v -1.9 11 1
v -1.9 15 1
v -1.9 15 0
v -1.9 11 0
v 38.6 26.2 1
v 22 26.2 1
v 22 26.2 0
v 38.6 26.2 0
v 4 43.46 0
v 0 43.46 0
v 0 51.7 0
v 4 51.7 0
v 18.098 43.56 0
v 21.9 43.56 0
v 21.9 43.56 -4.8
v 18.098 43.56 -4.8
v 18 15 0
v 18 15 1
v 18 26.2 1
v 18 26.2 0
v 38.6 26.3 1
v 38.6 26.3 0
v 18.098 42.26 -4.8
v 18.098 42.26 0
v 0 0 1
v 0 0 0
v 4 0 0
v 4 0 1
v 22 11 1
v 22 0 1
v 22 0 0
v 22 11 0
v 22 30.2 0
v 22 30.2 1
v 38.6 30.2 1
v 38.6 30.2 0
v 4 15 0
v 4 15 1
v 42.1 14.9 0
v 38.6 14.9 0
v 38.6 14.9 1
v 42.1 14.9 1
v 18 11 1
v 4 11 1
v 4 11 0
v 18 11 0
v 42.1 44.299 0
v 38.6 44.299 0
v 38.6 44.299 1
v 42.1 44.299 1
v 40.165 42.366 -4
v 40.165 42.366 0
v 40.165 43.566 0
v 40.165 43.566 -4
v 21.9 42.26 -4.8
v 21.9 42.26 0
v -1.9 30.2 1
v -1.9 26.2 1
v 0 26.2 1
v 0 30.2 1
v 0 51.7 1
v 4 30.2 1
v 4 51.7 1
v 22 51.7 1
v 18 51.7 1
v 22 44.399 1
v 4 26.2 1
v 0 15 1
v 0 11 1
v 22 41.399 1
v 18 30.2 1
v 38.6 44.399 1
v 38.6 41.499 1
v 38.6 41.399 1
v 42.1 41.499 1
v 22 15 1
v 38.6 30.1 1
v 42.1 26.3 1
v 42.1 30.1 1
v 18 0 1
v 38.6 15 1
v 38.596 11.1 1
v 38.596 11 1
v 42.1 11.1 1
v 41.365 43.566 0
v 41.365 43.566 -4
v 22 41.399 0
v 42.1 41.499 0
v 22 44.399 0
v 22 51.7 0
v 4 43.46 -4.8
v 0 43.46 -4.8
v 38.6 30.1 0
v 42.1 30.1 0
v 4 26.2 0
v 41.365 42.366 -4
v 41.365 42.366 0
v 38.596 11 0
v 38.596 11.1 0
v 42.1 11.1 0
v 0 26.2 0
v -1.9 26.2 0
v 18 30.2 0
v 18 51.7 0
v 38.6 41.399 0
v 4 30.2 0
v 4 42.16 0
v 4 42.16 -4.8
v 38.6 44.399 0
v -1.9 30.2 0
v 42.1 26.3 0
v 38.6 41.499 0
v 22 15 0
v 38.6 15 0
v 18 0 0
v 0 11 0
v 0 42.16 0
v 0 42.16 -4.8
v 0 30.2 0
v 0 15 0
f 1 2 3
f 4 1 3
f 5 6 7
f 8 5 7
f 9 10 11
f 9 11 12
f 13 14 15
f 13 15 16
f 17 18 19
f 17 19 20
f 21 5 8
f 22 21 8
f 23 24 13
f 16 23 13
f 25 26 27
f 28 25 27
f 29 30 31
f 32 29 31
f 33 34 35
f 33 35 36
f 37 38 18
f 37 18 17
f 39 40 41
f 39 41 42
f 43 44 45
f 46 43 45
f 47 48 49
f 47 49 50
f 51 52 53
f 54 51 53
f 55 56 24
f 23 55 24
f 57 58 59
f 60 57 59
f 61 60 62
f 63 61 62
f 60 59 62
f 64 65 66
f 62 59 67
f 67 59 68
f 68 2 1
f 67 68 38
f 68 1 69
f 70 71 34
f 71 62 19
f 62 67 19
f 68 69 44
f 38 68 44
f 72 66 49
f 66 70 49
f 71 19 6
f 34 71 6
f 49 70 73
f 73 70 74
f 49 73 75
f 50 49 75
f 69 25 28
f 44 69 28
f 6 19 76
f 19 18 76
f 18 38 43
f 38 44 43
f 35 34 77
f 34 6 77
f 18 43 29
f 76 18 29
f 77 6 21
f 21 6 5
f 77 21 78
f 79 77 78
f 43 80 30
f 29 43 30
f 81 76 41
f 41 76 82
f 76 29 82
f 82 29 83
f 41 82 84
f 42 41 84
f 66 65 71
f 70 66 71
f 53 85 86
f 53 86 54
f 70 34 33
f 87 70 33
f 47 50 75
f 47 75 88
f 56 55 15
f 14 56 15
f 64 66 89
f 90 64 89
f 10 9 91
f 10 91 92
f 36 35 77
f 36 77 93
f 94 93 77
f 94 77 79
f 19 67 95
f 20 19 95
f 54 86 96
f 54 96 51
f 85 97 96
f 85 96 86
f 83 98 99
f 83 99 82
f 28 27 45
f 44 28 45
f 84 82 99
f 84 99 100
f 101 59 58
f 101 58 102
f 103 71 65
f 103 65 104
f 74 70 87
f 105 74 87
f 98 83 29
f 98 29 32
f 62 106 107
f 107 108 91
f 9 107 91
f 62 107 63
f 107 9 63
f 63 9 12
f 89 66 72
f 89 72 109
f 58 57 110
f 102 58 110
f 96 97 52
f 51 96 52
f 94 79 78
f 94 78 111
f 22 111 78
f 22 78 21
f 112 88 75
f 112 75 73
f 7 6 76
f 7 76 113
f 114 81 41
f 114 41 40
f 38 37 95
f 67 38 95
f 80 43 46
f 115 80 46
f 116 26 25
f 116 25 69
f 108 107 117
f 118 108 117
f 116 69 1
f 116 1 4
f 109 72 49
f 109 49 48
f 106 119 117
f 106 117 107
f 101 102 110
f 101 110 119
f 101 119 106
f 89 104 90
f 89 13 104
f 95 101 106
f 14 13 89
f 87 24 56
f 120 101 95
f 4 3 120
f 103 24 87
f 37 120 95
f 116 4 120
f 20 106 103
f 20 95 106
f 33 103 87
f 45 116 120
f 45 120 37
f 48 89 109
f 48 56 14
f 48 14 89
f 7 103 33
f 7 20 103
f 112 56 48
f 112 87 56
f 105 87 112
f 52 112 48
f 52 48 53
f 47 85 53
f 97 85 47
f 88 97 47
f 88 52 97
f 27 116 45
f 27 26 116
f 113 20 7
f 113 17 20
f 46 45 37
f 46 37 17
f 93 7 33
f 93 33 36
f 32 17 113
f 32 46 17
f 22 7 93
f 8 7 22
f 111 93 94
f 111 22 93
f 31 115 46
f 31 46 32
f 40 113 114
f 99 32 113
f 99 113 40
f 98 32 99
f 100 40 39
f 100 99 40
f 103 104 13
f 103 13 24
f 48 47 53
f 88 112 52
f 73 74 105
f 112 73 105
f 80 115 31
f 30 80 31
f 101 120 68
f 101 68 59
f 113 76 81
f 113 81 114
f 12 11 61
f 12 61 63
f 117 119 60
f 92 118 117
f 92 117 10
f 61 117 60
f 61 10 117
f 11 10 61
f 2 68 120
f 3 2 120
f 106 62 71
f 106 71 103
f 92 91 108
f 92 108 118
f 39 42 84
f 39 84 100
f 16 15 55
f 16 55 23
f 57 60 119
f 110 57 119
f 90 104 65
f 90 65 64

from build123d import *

# Parameters (mm, degrees)
SCHIZZO1_W                        = 4
SCHIZZO1_H                        = 51.7
ESTRUSIONE_ESTRUSIONE1_DEPTH      = 1
SCHIZZO2_W                        = 1
SCHIZZO2_H                        = 4
ESTRUSIONE_ESTRUSIONE2_DEPTH      = 18
ESTRUSIONE_ESTRUSIONE2_DEPTH_BACK = 5.9
SCHIZZO3_W                        = 1
SCHIZZO3_H                        = 4
ESTRUSIONE_ESTRUSIONE3_DEPTH      = 18
ESTRUSIONE_ESTRUSIONE3_DEPTH_BACK = 5.9
SCHIZZO4_W                        = 4
SCHIZZO4_H                        = 1
ESTRUSIONE_ESTRUSIONE4_DEPTH      = 21.5
ESTRUSIONE_ESTRUSIONE4_DEPTH_BACK = 30.2
SCHIZZO5_W                        = 1
SCHIZZO5_H                        = 3
ESTRUSIONE_ESTRUSIONE5_DEPTH      = 21
SCHIZZO7_W                        = 1
SCHIZZO7_H                        = 4
ESTRUSIONE_ESTRUSIONE6_DEPTH      = 21
SCHIZZO8_W                        = 1
SCHIZZO8_H                        = 4
ESTRUSIONE_ESTRUSIONE7_DEPTH      = 21
SCHIZZO10_W                       = 4
SCHIZZO10_H                       = 1.3
ESTRUSIONE_ESTRUSIONE9_DEPTH      = 4.8
SCHIZZO11_W                       = 3.9
SCHIZZO11_H                       = 1.3
ESTRUSIONE_ESTRUSIONE10_DEPTH     = 4.8
SCHIZZO12_W                       = 1.2
SCHIZZO12_H                       = 1.2
ESTRUSIONE_ESTRUSIONE11_DEPTH     = 4
SCHIZZO13_W                       = 1
SCHIZZO13_H                       = 4
TAGLIO_ESTRUSIONE1_DEPTH          = 0.9
SCHIZZO14_W                       = 1
SCHIZZO14_H                       = 4
TAGLIO_ESTRUSIONE2_DEPTH          = 0.9
SCHIZZO15_W                       = 1
SCHIZZO15_H                       = 3
TAGLIO_ESTRUSIONE3_DEPTH          = 0.9
SCHIZZO16_W                       = 3.503631624
SCHIZZO16_H                       = 1
TAGLIO_ESTRUSIONE4_DEPTH          = 0.1
SCHIZZO17_W                       = 3.5
SCHIZZO17_H                       = 1
TAGLIO_ESTRUSIONE5_DEPTH          = 0.1
SCHIZZO18_W                       = 3.5
SCHIZZO18_H                       = 1
TAGLIO_ESTRUSIONE6_DEPTH          = 0.1
SCHIZZO19_W                       = 3.5
SCHIZZO19_H                       = 1
TAGLIO_ESTRUSIONE7_DEPTH          = 0.1
SCHIZZO20_W                       = 3.5
SCHIZZO20_H                       = 1
TAGLIO_ESTRUSIONE8_DEPTH          = 0.1
SCHIZZO21_W                       = 3.5
SCHIZZO21_H                       = 1
TAGLIO_ESTRUSIONE9_DEPTH          = 0.1
SCHIZZO22_W                       = 0.098173234
SCHIZZO22_H                       = 1.3
TAGLIO_ESTRUSIONE10_DEPTH         = 4.8


with BuildPart() as part:
    # Schizzo1 → Estrusione-Estrusione1 (new body)
    with BuildSketch(Plane.XY):
        with Locations((2, 25.85)):
            Rectangle(SCHIZZO1_W, SCHIZZO1_H)
    extrude(amount=ESTRUSIONE_ESTRUSIONE1_DEPTH)

    # Schizzo2 → Estrusione-Estrusione2 (add, two sides)
    with BuildSketch(Plane(origin=(4, 0, 0), x_dir=(0, 0, -1), z_dir=(1, 0, 0))) as estrusione_estrusione2_sk:
        with Locations((-0.5, 28.2)):
            Rectangle(SCHIZZO2_W, SCHIZZO2_H)
    extrude(amount=ESTRUSIONE_ESTRUSIONE2_DEPTH)
    extrude(estrusione_estrusione2_sk.sketch, amount=-ESTRUSIONE_ESTRUSIONE2_DEPTH_BACK)

    # Schizzo3 → Estrusione-Estrusione3 (add, two sides)
    with BuildSketch(Plane(origin=(4, 0, 0), x_dir=(0, 0, -1), z_dir=(1, 0, 0))) as estrusione_estrusione3_sk:
        with Locations((-0.5, 13)):
            Rectangle(SCHIZZO3_W, SCHIZZO3_H)
    extrude(amount=ESTRUSIONE_ESTRUSIONE3_DEPTH)
    extrude(estrusione_estrusione3_sk.sketch, amount=-ESTRUSIONE_ESTRUSIONE3_DEPTH_BACK)

    # Schizzo4 → Estrusione-Estrusione4 (add, two sides)
    with BuildSketch(Plane(origin=(0, 30.2, 0), x_dir=(1, 0, 0), z_dir=(0, 1, 0))) as estrusione_estrusione4_sk:
        with Locations((20, -0.5)):
            Rectangle(SCHIZZO4_W, SCHIZZO4_H)
    extrude(amount=ESTRUSIONE_ESTRUSIONE4_DEPTH)
    extrude(estrusione_estrusione4_sk.sketch, amount=-ESTRUSIONE_ESTRUSIONE4_DEPTH_BACK)

    # Schizzo5 → Estrusione-Estrusione5 (add)
    with BuildSketch(Plane(origin=(22, 0, 0), x_dir=(0, 0, -1), z_dir=(1, 0, 0))):
        with Locations((-0.5, 42.898738045)):
            Rectangle(SCHIZZO5_W, SCHIZZO5_H)
    extrude(amount=ESTRUSIONE_ESTRUSIONE5_DEPTH)

    # Schizzo7 → Estrusione-Estrusione6 (add)
    with BuildSketch(Plane(origin=(22, 0, 0), x_dir=(0, 0, -1), z_dir=(1, 0, 0))):
        with Locations((-0.5, 13)):
            Rectangle(SCHIZZO7_W, SCHIZZO7_H)
    extrude(amount=ESTRUSIONE_ESTRUSIONE6_DEPTH)

    # Schizzo8 → Estrusione-Estrusione7 (add)
    with BuildSketch(Plane(origin=(22, 0, 0), x_dir=(0, 0, -1), z_dir=(1, 0, 0))):
        with Locations((-0.5, 28.2)):
            Rectangle(SCHIZZO8_W, SCHIZZO8_H)
    extrude(amount=ESTRUSIONE_ESTRUSIONE7_DEPTH)

    # Schizzo10 → Estrusione-Estrusione9 (add)
    with BuildSketch(Plane(origin=(0, 0, 0), x_dir=(-1, 0, 0), z_dir=(0, 0, -1))):
        with Locations((-2, 42.81)):
            Rectangle(SCHIZZO10_W, SCHIZZO10_H)
    extrude(amount=ESTRUSIONE_ESTRUSIONE9_DEPTH)

    # Schizzo11 → Estrusione-Estrusione10 (add)
    with BuildSketch(Plane(origin=(0, 0, 0), x_dir=(-1, 0, 0), z_dir=(0, 0, -1))):
        with Locations((-19.95, 42.91)):
            Rectangle(SCHIZZO11_W, SCHIZZO11_H)
    extrude(amount=ESTRUSIONE_ESTRUSIONE10_DEPTH)

    # Schizzo12 → Estrusione-Estrusione11 (add)
    with BuildSketch(Plane(origin=(0, 0, 0), x_dir=(-1, 0, 0), z_dir=(0, 0, -1))):
        with Locations((-40.765421969, 42.965995875)):
            Rectangle(SCHIZZO12_W, SCHIZZO12_H)
    extrude(amount=ESTRUSIONE_ESTRUSIONE11_DEPTH)

    # Schizzo13 → Taglio-Estrusione1 (cut)
    with BuildSketch(Plane(origin=(43, 0, 0), x_dir=(0, 0, -1), z_dir=(1, 0, 0))):
        with Locations((-0.5, 28.2)):
            Rectangle(SCHIZZO13_W, SCHIZZO13_H)
    extrude(amount=-TAGLIO_ESTRUSIONE1_DEPTH, mode=Mode.SUBTRACT)

    # Schizzo14 → Taglio-Estrusione2 (cut)
    with BuildSketch(Plane(origin=(43, 0, 0), x_dir=(0, 0, -1), z_dir=(1, 0, 0))):
        with Locations((-0.5, 13)):
            Rectangle(SCHIZZO14_W, SCHIZZO14_H)
    extrude(amount=-TAGLIO_ESTRUSIONE2_DEPTH, mode=Mode.SUBTRACT)

    # Schizzo15 → Taglio-Estrusione3 (cut)
    with BuildSketch(Plane(origin=(43, 0, 0), x_dir=(0, 0, -1), z_dir=(1, 0, 0))):
        with Locations((-0.5, 42.898738045)):
            Rectangle(SCHIZZO15_W, SCHIZZO15_H)
    extrude(amount=-TAGLIO_ESTRUSIONE3_DEPTH, mode=Mode.SUBTRACT)

    # Schizzo16 → Taglio-Estrusione4 (cut)
    with BuildSketch(Plane.XZ.offset(-11)):
        with Locations((40.348184188, 0.5)):
            Rectangle(SCHIZZO16_W, SCHIZZO16_H)
    extrude(amount=-TAGLIO_ESTRUSIONE4_DEPTH, mode=Mode.SUBTRACT)

    # Schizzo17 → Taglio-Estrusione5 (cut)
    with BuildSketch(Plane(origin=(0, 15, 0), x_dir=(1, 0, 0), z_dir=(0, 1, 0))):
        with Locations((40.35, -0.5)):
            Rectangle(SCHIZZO17_W, SCHIZZO17_H)
    extrude(amount=-TAGLIO_ESTRUSIONE5_DEPTH, mode=Mode.SUBTRACT)

    # Schizzo18 → Taglio-Estrusione6 (cut)
    with BuildSketch(Plane(origin=(0, 30.2, 0), x_dir=(1, 0, 0), z_dir=(0, 1, 0))):
        with Locations((40.35, -0.5)):
            Rectangle(SCHIZZO18_W, SCHIZZO18_H)
    extrude(amount=-TAGLIO_ESTRUSIONE6_DEPTH, mode=Mode.SUBTRACT)

    # Schizzo19 → Taglio-Estrusione7 (cut)
    with BuildSketch(Plane(origin=(0, 26.2, 0), x_dir=(-1, 0, 0), z_dir=(0, -1, 0))):
        with Locations((-40.35, -0.5)):
            Rectangle(SCHIZZO19_W, SCHIZZO19_H)
    extrude(amount=-TAGLIO_ESTRUSIONE7_DEPTH, mode=Mode.SUBTRACT)

    # Schizzo20 → Taglio-Estrusione8 (cut)
    with BuildSketch(Plane(origin=(0, 41.398738045, 0), x_dir=(-1, 0, 0), z_dir=(0, -1, 0))):
        with Locations((-40.35, -0.5)):
            Rectangle(SCHIZZO20_W, SCHIZZO20_H)
    extrude(amount=-TAGLIO_ESTRUSIONE8_DEPTH, mode=Mode.SUBTRACT)

    # Schizzo21 → Taglio-Estrusione9 (cut)
    with BuildSketch(Plane(origin=(0, 44.398738045, 0), x_dir=(1, 0, 0), z_dir=(0, 1, 0))):
        with Locations((40.35, -0.5)):
            Rectangle(SCHIZZO21_W, SCHIZZO21_H)
    extrude(amount=-TAGLIO_ESTRUSIONE9_DEPTH, mode=Mode.SUBTRACT)

    # Schizzo22 → Taglio-Estrusione10 (cut)
    with BuildSketch(Plane(origin=(0, 0, -4.8), x_dir=(-1, 0, 0), z_dir=(0, 0, -1))):
        with Locations((-18.049086617, 42.91)):
            Rectangle(SCHIZZO22_W, SCHIZZO22_H)
    extrude(amount=-TAGLIO_ESTRUSIONE10_DEPTH, mode=Mode.SUBTRACT)


solid = part.part
